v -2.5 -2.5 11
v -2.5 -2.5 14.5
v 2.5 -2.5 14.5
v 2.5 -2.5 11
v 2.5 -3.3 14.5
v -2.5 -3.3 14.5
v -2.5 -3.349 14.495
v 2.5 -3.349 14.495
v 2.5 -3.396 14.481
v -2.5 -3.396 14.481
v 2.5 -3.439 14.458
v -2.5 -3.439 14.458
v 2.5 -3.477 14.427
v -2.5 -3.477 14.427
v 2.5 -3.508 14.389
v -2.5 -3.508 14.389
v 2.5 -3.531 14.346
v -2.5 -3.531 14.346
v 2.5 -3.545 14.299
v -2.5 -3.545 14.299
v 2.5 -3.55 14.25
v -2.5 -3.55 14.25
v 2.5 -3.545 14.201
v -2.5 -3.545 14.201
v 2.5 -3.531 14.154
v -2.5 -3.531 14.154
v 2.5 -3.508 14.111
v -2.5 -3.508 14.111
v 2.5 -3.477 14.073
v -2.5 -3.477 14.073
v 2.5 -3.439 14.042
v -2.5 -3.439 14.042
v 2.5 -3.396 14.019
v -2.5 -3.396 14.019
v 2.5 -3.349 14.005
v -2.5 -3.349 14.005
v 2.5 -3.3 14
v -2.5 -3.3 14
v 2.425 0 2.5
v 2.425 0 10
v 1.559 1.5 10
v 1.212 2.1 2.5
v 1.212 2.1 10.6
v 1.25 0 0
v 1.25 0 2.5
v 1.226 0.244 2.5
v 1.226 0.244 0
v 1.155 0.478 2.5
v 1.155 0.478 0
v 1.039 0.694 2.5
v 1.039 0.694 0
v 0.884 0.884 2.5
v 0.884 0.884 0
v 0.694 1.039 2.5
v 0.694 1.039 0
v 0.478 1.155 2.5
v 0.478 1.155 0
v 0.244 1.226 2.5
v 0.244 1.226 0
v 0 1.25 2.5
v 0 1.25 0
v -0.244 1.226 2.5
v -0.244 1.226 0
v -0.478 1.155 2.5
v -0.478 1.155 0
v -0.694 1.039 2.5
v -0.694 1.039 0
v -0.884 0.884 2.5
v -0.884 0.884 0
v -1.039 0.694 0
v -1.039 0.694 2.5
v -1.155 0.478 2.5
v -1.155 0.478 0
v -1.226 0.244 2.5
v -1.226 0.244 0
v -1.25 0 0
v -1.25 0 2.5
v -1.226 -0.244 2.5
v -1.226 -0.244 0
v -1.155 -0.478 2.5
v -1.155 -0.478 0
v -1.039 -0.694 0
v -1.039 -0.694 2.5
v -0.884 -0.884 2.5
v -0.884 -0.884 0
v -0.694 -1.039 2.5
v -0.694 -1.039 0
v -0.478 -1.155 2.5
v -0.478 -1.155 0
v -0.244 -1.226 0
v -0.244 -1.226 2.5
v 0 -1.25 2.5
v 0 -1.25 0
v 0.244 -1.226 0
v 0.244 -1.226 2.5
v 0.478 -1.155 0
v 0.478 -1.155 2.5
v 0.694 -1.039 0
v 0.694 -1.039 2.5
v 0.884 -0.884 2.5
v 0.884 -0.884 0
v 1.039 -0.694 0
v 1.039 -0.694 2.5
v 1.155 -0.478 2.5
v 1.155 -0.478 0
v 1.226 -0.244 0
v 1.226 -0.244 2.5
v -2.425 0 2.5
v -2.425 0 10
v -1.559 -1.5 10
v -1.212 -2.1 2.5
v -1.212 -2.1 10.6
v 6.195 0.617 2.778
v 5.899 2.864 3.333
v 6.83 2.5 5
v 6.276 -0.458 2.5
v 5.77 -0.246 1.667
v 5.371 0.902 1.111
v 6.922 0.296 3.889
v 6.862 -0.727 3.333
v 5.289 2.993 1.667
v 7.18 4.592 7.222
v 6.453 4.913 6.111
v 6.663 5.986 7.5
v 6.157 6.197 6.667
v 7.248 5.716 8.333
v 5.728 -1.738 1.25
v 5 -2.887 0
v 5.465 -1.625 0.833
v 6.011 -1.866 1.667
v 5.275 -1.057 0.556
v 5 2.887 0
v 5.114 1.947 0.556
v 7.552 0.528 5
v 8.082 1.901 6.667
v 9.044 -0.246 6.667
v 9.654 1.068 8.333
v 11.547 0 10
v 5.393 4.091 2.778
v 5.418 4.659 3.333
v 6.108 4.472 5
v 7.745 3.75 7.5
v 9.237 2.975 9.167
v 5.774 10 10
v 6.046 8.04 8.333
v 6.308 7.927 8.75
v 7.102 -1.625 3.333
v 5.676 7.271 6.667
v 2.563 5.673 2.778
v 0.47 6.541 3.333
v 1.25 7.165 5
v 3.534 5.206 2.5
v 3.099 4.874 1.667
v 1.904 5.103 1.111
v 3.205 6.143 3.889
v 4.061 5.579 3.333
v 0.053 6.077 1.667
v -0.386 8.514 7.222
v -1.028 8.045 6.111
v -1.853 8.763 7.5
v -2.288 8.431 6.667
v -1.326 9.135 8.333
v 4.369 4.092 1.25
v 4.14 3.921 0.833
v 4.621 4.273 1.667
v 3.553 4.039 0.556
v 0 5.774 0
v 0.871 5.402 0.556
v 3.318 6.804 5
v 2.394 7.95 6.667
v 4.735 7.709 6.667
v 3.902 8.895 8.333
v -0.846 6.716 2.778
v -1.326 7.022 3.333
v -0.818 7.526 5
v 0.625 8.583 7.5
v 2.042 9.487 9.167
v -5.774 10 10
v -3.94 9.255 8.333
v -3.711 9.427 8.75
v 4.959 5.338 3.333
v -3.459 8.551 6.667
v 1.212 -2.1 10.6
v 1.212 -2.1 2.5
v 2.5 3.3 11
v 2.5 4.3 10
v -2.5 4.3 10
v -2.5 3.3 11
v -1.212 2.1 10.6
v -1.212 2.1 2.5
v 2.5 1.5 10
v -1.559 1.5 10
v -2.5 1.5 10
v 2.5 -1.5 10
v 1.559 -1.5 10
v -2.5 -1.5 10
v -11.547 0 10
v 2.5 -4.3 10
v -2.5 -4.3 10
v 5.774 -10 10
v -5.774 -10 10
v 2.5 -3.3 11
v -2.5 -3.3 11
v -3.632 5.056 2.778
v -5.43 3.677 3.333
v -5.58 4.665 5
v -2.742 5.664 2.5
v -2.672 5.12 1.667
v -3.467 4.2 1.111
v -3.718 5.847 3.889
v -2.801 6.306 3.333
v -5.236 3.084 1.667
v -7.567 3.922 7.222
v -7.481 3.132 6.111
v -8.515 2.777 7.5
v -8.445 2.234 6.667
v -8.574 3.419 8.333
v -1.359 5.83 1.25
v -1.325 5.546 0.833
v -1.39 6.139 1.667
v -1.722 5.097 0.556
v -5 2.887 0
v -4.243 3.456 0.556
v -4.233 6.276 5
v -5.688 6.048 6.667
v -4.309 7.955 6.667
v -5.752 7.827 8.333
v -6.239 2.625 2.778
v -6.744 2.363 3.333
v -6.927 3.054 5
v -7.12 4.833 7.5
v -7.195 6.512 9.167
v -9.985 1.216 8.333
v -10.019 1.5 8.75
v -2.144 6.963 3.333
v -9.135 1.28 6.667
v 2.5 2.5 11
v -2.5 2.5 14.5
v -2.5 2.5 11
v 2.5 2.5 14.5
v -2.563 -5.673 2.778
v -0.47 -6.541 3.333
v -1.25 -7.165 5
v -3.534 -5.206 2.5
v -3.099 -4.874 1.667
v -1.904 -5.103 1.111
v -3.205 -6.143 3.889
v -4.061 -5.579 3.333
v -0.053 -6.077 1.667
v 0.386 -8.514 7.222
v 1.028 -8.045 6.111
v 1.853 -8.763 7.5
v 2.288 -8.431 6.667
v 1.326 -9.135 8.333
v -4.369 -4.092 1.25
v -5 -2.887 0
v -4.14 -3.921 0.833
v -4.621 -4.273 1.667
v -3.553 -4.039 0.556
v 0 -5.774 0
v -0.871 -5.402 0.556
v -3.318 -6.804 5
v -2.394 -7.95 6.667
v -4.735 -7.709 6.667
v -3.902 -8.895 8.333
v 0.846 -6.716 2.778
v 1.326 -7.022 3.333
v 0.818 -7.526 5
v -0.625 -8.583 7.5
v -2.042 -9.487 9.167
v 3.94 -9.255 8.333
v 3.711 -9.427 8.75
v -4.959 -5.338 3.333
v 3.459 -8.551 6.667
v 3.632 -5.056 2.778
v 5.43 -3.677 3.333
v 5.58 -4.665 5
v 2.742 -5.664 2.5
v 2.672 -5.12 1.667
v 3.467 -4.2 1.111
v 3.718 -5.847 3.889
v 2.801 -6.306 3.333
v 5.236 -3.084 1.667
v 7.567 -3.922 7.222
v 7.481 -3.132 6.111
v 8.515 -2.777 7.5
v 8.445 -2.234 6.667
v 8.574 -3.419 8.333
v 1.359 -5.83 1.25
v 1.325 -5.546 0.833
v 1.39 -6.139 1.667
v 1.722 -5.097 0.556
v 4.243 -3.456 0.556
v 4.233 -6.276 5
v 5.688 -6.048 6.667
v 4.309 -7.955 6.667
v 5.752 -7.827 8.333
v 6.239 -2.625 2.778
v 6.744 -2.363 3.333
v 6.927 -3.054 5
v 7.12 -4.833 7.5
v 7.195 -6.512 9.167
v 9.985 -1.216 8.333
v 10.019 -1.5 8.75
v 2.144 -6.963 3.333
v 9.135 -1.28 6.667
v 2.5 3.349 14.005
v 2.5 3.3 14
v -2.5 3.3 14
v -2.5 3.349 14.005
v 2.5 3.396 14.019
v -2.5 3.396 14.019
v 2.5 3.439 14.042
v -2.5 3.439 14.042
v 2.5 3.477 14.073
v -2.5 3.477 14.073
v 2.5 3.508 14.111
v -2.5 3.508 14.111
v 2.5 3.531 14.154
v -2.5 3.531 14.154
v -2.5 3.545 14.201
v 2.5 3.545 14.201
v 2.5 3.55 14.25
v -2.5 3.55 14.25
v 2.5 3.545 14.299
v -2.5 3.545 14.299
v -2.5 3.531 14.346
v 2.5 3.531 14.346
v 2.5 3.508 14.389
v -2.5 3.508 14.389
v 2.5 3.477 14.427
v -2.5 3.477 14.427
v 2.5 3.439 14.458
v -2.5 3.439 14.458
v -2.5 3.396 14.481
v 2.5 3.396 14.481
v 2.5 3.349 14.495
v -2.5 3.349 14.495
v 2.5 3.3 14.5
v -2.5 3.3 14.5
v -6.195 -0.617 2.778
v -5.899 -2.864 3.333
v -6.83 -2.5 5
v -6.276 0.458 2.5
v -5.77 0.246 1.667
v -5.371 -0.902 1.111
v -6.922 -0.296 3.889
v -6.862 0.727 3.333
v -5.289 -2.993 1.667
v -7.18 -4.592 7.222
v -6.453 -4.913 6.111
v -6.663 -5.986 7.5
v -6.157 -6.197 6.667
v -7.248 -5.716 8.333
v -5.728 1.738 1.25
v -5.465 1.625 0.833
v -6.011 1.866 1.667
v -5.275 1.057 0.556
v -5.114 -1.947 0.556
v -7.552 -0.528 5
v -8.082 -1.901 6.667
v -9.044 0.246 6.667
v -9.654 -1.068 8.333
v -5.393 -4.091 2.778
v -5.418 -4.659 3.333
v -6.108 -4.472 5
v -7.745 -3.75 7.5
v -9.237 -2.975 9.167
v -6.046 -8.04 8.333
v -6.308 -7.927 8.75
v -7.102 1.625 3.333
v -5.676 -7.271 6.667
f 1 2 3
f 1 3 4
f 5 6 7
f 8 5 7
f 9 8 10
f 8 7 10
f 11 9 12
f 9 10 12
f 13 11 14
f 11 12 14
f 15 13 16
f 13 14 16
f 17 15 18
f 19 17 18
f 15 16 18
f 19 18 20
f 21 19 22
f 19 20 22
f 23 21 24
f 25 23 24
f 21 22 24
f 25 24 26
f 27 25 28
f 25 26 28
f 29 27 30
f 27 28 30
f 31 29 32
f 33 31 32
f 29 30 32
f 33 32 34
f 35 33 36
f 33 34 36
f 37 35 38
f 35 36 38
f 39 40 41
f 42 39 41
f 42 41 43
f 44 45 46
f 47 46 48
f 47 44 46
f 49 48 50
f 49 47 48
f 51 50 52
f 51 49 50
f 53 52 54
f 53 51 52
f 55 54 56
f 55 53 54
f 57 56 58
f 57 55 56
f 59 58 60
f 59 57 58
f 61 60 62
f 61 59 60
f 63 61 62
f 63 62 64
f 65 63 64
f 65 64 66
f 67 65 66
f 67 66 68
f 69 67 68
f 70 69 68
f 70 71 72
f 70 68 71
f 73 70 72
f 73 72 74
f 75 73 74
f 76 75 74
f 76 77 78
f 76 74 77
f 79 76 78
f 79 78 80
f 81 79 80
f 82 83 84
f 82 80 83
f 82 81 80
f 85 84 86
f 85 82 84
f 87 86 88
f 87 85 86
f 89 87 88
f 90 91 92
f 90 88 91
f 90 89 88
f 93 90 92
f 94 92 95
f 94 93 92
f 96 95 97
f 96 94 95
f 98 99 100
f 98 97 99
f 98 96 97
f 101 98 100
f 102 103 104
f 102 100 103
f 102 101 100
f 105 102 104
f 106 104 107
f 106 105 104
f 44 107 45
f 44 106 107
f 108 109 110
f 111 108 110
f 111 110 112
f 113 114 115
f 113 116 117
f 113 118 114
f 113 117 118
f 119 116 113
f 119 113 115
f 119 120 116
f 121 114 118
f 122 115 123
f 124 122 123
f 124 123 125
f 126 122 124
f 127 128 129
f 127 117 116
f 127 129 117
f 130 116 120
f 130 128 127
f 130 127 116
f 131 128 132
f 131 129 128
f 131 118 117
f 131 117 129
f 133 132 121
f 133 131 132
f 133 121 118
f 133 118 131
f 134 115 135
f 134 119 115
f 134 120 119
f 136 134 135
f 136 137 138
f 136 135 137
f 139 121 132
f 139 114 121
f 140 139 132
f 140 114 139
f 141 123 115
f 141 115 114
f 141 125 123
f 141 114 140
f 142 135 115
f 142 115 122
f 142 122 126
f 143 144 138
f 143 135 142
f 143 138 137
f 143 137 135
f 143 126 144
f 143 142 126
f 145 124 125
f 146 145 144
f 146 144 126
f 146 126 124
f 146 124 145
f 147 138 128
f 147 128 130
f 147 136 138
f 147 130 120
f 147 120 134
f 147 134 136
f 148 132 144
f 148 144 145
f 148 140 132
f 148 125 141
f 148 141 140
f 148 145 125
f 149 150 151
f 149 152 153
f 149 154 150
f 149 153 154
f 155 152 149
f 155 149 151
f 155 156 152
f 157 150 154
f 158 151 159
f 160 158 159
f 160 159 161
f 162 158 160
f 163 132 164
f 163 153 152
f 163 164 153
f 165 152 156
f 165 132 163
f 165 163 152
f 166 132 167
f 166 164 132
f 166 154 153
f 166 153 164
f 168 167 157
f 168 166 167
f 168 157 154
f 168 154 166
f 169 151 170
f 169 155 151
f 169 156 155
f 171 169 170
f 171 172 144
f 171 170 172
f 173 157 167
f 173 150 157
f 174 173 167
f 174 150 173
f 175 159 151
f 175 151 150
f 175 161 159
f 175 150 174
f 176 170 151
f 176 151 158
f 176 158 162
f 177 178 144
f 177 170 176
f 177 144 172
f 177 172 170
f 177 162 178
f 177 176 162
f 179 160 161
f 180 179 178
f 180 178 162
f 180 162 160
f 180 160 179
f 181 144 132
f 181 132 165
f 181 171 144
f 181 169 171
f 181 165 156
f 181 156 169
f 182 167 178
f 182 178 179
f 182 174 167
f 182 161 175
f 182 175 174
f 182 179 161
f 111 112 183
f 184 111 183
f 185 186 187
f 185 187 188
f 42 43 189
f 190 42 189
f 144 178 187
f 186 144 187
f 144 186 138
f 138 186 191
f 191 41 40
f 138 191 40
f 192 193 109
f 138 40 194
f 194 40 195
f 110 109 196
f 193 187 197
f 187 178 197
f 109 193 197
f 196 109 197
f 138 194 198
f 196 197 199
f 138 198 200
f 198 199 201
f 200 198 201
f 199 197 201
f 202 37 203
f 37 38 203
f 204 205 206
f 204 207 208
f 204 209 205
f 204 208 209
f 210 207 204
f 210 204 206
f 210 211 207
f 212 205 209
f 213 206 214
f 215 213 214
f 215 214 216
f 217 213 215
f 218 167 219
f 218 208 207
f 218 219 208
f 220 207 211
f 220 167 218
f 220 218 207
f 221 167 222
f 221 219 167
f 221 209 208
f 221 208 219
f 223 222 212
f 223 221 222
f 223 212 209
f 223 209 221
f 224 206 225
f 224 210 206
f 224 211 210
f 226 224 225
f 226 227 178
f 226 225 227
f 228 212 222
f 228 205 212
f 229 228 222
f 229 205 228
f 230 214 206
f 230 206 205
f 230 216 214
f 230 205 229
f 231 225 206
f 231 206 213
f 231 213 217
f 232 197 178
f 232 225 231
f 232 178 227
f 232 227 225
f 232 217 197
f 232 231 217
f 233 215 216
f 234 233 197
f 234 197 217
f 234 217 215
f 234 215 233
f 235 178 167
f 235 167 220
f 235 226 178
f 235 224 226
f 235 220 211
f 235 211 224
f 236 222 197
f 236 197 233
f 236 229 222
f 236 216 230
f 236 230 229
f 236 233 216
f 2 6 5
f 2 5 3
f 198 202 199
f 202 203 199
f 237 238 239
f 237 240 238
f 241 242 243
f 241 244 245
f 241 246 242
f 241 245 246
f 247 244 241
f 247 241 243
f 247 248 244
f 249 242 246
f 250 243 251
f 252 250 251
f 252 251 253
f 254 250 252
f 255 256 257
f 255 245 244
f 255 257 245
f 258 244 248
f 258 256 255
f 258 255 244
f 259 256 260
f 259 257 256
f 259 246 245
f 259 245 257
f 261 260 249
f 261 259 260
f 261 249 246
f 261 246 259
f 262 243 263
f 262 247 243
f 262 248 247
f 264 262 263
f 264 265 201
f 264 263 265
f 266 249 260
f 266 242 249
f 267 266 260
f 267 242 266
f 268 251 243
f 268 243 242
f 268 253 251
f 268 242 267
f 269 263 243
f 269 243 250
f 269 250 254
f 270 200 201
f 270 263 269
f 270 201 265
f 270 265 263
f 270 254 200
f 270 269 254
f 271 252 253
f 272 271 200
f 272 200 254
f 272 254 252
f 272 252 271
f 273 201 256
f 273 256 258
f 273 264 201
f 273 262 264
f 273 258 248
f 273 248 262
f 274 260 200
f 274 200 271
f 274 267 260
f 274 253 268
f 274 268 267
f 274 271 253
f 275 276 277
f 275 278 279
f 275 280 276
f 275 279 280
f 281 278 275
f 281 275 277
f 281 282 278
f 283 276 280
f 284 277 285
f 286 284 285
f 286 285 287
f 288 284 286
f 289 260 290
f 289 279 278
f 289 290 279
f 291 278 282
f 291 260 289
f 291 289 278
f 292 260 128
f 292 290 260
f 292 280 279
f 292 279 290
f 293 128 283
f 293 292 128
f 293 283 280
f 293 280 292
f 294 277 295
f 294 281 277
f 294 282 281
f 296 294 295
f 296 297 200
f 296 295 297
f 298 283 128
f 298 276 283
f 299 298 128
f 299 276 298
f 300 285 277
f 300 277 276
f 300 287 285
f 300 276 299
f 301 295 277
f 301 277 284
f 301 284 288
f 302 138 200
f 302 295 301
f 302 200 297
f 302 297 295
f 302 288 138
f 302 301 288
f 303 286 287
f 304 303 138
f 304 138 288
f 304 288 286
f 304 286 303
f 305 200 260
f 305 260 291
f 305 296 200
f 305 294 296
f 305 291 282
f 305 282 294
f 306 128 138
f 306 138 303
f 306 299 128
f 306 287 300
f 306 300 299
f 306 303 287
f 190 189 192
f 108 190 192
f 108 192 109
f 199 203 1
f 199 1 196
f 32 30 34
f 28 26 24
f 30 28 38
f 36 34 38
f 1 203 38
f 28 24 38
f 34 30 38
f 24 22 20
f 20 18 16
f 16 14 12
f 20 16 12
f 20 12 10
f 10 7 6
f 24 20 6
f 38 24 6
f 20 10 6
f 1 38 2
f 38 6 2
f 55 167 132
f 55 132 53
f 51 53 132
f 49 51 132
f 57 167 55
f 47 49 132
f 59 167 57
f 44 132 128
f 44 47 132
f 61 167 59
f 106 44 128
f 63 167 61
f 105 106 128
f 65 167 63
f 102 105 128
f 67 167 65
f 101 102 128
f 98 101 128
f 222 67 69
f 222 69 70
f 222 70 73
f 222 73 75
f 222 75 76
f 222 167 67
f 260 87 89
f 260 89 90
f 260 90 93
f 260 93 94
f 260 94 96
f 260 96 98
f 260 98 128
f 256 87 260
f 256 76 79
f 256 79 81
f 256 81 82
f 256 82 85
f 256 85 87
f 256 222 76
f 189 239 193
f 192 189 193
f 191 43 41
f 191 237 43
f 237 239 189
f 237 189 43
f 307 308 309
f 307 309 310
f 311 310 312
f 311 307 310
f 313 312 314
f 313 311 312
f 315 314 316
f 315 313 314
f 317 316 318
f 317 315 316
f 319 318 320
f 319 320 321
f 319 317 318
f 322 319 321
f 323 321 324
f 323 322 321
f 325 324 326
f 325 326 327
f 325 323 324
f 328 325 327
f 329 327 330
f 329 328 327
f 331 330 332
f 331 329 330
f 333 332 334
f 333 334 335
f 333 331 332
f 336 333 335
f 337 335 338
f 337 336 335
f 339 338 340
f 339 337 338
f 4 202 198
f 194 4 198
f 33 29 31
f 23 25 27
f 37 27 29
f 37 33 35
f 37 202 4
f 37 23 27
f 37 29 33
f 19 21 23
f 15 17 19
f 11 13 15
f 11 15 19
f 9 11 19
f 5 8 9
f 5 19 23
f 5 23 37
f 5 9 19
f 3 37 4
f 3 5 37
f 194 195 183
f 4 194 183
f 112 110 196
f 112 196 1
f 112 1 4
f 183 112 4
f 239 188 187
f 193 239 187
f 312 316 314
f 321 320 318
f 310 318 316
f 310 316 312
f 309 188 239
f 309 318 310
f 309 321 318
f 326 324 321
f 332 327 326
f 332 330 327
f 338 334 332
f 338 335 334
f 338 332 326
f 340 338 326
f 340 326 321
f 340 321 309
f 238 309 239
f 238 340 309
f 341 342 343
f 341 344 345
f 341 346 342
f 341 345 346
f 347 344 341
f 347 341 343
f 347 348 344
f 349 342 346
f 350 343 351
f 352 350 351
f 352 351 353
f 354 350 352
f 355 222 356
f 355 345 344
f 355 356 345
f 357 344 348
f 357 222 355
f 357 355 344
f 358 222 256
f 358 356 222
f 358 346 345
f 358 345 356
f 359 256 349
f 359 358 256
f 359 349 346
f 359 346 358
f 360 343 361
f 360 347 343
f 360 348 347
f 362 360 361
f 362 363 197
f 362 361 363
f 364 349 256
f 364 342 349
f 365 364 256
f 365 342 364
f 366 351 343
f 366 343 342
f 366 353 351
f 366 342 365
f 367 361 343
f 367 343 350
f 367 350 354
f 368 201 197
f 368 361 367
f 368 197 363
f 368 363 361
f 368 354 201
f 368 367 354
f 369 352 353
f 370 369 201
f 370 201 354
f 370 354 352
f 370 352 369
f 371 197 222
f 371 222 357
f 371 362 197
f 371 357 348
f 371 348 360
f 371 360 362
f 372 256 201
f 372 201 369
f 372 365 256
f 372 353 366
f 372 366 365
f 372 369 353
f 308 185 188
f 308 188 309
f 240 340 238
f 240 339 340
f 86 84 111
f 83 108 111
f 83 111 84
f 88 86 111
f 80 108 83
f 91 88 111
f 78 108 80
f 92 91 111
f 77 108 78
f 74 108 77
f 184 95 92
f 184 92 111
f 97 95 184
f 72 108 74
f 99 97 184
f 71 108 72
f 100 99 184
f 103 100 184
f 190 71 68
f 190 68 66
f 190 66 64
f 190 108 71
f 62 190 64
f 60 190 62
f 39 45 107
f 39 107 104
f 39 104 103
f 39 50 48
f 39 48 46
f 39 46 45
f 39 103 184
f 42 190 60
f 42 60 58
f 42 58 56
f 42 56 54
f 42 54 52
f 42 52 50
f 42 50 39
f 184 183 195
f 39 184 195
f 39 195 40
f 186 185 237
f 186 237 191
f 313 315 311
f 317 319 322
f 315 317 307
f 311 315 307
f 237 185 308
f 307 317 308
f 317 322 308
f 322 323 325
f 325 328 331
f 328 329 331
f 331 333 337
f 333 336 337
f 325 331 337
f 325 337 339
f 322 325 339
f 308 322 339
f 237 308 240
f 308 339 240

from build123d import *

# Parameters (mm, degrees)
SKETCH004_R     = 1.25
POCKET_DEPTH    = 10.001
PAD_DEPTH       = 2.5
POCKET005_DEPTH = 12


with BuildPart() as part:
    # Sketch → AdditiveLoft section 0
    with BuildSketch(Plane.XY):
        Polygon((0, 5.773503), (-5, 2.886751), (-5, -2.886751), (0, -5.773503), (5, -2.886751), (5, 2.886751), align=None)
    # Sketch001 (on DatumPlane) → AdditiveLoft section 1
    with BuildSketch(Plane.XY.offset(10)):
        Polygon((-5.773503, 10), (-11.547005, 0), (-5.773503, -10), (5.773503, -10), (11.547005, 0), (5.773503, 10), align=None)
    loft()

    # Sketch004 → Pocket (cut, through all)
    with BuildSketch(Plane.XY):
        Circle(SKETCH004_R)
    extrude(amount=POCKET_DEPTH, mode=Mode.SUBTRACT)

    # Sketch020 (on DatumPlane) → Pad (join, symmetric)
    with BuildSketch(Plane(origin=(0, 0, 10), x_dir=(0, 1, 0), z_dir=(1, 0, 0))):
        with BuildLine():
            ThreePointArc((-3.3, 4.5), (-3.55, 4.25), (-3.3, 4))
            Line((-3.3, 4), (-3.3, 1))
            Line((-3.3, 1), (-4.3, 0))
            Line((-4.3, 0), (-1.5, 0))
            Line((-1.5, 0), (-2.5, 1))
            Line((-2.5, 4.5), (-2.5, 1))
            Line((-3.3, 4.5), (-2.5, 4.5))
        make_face()
        with BuildLine():
            Line((4.3, 0), (1.5, 0))
            Line((2.5, 1), (1.5, 0))
            Line((2.5, 4.5), (2.5, 1))
            Line((3.3, 4.5), (2.5, 4.5))
            ThreePointArc((3.3, 4), (3.55, 4.25), (3.3, 4.5))
            Line((3.3, 1), (3.3, 4))
            Line((4.3, 0), (3.3, 1))
        make_face()
    extrude(amount=PAD_DEPTH, both=True)

    # Sketch017 (on DatumPlane) → Pocket005 (cut)
    with BuildSketch(Plane.XY.offset(14.5)):
        Polygon((1.212436, 2.1), (-1.212436, 2.1), (-2.424871, 0), (-1.212436, -2.1), (1.212436, -2.1), (2.424871, 0), align=None)
    extrude(amount=-POCKET005_DEPTH, mode=Mode.SUBTRACT)


solid = part.part
